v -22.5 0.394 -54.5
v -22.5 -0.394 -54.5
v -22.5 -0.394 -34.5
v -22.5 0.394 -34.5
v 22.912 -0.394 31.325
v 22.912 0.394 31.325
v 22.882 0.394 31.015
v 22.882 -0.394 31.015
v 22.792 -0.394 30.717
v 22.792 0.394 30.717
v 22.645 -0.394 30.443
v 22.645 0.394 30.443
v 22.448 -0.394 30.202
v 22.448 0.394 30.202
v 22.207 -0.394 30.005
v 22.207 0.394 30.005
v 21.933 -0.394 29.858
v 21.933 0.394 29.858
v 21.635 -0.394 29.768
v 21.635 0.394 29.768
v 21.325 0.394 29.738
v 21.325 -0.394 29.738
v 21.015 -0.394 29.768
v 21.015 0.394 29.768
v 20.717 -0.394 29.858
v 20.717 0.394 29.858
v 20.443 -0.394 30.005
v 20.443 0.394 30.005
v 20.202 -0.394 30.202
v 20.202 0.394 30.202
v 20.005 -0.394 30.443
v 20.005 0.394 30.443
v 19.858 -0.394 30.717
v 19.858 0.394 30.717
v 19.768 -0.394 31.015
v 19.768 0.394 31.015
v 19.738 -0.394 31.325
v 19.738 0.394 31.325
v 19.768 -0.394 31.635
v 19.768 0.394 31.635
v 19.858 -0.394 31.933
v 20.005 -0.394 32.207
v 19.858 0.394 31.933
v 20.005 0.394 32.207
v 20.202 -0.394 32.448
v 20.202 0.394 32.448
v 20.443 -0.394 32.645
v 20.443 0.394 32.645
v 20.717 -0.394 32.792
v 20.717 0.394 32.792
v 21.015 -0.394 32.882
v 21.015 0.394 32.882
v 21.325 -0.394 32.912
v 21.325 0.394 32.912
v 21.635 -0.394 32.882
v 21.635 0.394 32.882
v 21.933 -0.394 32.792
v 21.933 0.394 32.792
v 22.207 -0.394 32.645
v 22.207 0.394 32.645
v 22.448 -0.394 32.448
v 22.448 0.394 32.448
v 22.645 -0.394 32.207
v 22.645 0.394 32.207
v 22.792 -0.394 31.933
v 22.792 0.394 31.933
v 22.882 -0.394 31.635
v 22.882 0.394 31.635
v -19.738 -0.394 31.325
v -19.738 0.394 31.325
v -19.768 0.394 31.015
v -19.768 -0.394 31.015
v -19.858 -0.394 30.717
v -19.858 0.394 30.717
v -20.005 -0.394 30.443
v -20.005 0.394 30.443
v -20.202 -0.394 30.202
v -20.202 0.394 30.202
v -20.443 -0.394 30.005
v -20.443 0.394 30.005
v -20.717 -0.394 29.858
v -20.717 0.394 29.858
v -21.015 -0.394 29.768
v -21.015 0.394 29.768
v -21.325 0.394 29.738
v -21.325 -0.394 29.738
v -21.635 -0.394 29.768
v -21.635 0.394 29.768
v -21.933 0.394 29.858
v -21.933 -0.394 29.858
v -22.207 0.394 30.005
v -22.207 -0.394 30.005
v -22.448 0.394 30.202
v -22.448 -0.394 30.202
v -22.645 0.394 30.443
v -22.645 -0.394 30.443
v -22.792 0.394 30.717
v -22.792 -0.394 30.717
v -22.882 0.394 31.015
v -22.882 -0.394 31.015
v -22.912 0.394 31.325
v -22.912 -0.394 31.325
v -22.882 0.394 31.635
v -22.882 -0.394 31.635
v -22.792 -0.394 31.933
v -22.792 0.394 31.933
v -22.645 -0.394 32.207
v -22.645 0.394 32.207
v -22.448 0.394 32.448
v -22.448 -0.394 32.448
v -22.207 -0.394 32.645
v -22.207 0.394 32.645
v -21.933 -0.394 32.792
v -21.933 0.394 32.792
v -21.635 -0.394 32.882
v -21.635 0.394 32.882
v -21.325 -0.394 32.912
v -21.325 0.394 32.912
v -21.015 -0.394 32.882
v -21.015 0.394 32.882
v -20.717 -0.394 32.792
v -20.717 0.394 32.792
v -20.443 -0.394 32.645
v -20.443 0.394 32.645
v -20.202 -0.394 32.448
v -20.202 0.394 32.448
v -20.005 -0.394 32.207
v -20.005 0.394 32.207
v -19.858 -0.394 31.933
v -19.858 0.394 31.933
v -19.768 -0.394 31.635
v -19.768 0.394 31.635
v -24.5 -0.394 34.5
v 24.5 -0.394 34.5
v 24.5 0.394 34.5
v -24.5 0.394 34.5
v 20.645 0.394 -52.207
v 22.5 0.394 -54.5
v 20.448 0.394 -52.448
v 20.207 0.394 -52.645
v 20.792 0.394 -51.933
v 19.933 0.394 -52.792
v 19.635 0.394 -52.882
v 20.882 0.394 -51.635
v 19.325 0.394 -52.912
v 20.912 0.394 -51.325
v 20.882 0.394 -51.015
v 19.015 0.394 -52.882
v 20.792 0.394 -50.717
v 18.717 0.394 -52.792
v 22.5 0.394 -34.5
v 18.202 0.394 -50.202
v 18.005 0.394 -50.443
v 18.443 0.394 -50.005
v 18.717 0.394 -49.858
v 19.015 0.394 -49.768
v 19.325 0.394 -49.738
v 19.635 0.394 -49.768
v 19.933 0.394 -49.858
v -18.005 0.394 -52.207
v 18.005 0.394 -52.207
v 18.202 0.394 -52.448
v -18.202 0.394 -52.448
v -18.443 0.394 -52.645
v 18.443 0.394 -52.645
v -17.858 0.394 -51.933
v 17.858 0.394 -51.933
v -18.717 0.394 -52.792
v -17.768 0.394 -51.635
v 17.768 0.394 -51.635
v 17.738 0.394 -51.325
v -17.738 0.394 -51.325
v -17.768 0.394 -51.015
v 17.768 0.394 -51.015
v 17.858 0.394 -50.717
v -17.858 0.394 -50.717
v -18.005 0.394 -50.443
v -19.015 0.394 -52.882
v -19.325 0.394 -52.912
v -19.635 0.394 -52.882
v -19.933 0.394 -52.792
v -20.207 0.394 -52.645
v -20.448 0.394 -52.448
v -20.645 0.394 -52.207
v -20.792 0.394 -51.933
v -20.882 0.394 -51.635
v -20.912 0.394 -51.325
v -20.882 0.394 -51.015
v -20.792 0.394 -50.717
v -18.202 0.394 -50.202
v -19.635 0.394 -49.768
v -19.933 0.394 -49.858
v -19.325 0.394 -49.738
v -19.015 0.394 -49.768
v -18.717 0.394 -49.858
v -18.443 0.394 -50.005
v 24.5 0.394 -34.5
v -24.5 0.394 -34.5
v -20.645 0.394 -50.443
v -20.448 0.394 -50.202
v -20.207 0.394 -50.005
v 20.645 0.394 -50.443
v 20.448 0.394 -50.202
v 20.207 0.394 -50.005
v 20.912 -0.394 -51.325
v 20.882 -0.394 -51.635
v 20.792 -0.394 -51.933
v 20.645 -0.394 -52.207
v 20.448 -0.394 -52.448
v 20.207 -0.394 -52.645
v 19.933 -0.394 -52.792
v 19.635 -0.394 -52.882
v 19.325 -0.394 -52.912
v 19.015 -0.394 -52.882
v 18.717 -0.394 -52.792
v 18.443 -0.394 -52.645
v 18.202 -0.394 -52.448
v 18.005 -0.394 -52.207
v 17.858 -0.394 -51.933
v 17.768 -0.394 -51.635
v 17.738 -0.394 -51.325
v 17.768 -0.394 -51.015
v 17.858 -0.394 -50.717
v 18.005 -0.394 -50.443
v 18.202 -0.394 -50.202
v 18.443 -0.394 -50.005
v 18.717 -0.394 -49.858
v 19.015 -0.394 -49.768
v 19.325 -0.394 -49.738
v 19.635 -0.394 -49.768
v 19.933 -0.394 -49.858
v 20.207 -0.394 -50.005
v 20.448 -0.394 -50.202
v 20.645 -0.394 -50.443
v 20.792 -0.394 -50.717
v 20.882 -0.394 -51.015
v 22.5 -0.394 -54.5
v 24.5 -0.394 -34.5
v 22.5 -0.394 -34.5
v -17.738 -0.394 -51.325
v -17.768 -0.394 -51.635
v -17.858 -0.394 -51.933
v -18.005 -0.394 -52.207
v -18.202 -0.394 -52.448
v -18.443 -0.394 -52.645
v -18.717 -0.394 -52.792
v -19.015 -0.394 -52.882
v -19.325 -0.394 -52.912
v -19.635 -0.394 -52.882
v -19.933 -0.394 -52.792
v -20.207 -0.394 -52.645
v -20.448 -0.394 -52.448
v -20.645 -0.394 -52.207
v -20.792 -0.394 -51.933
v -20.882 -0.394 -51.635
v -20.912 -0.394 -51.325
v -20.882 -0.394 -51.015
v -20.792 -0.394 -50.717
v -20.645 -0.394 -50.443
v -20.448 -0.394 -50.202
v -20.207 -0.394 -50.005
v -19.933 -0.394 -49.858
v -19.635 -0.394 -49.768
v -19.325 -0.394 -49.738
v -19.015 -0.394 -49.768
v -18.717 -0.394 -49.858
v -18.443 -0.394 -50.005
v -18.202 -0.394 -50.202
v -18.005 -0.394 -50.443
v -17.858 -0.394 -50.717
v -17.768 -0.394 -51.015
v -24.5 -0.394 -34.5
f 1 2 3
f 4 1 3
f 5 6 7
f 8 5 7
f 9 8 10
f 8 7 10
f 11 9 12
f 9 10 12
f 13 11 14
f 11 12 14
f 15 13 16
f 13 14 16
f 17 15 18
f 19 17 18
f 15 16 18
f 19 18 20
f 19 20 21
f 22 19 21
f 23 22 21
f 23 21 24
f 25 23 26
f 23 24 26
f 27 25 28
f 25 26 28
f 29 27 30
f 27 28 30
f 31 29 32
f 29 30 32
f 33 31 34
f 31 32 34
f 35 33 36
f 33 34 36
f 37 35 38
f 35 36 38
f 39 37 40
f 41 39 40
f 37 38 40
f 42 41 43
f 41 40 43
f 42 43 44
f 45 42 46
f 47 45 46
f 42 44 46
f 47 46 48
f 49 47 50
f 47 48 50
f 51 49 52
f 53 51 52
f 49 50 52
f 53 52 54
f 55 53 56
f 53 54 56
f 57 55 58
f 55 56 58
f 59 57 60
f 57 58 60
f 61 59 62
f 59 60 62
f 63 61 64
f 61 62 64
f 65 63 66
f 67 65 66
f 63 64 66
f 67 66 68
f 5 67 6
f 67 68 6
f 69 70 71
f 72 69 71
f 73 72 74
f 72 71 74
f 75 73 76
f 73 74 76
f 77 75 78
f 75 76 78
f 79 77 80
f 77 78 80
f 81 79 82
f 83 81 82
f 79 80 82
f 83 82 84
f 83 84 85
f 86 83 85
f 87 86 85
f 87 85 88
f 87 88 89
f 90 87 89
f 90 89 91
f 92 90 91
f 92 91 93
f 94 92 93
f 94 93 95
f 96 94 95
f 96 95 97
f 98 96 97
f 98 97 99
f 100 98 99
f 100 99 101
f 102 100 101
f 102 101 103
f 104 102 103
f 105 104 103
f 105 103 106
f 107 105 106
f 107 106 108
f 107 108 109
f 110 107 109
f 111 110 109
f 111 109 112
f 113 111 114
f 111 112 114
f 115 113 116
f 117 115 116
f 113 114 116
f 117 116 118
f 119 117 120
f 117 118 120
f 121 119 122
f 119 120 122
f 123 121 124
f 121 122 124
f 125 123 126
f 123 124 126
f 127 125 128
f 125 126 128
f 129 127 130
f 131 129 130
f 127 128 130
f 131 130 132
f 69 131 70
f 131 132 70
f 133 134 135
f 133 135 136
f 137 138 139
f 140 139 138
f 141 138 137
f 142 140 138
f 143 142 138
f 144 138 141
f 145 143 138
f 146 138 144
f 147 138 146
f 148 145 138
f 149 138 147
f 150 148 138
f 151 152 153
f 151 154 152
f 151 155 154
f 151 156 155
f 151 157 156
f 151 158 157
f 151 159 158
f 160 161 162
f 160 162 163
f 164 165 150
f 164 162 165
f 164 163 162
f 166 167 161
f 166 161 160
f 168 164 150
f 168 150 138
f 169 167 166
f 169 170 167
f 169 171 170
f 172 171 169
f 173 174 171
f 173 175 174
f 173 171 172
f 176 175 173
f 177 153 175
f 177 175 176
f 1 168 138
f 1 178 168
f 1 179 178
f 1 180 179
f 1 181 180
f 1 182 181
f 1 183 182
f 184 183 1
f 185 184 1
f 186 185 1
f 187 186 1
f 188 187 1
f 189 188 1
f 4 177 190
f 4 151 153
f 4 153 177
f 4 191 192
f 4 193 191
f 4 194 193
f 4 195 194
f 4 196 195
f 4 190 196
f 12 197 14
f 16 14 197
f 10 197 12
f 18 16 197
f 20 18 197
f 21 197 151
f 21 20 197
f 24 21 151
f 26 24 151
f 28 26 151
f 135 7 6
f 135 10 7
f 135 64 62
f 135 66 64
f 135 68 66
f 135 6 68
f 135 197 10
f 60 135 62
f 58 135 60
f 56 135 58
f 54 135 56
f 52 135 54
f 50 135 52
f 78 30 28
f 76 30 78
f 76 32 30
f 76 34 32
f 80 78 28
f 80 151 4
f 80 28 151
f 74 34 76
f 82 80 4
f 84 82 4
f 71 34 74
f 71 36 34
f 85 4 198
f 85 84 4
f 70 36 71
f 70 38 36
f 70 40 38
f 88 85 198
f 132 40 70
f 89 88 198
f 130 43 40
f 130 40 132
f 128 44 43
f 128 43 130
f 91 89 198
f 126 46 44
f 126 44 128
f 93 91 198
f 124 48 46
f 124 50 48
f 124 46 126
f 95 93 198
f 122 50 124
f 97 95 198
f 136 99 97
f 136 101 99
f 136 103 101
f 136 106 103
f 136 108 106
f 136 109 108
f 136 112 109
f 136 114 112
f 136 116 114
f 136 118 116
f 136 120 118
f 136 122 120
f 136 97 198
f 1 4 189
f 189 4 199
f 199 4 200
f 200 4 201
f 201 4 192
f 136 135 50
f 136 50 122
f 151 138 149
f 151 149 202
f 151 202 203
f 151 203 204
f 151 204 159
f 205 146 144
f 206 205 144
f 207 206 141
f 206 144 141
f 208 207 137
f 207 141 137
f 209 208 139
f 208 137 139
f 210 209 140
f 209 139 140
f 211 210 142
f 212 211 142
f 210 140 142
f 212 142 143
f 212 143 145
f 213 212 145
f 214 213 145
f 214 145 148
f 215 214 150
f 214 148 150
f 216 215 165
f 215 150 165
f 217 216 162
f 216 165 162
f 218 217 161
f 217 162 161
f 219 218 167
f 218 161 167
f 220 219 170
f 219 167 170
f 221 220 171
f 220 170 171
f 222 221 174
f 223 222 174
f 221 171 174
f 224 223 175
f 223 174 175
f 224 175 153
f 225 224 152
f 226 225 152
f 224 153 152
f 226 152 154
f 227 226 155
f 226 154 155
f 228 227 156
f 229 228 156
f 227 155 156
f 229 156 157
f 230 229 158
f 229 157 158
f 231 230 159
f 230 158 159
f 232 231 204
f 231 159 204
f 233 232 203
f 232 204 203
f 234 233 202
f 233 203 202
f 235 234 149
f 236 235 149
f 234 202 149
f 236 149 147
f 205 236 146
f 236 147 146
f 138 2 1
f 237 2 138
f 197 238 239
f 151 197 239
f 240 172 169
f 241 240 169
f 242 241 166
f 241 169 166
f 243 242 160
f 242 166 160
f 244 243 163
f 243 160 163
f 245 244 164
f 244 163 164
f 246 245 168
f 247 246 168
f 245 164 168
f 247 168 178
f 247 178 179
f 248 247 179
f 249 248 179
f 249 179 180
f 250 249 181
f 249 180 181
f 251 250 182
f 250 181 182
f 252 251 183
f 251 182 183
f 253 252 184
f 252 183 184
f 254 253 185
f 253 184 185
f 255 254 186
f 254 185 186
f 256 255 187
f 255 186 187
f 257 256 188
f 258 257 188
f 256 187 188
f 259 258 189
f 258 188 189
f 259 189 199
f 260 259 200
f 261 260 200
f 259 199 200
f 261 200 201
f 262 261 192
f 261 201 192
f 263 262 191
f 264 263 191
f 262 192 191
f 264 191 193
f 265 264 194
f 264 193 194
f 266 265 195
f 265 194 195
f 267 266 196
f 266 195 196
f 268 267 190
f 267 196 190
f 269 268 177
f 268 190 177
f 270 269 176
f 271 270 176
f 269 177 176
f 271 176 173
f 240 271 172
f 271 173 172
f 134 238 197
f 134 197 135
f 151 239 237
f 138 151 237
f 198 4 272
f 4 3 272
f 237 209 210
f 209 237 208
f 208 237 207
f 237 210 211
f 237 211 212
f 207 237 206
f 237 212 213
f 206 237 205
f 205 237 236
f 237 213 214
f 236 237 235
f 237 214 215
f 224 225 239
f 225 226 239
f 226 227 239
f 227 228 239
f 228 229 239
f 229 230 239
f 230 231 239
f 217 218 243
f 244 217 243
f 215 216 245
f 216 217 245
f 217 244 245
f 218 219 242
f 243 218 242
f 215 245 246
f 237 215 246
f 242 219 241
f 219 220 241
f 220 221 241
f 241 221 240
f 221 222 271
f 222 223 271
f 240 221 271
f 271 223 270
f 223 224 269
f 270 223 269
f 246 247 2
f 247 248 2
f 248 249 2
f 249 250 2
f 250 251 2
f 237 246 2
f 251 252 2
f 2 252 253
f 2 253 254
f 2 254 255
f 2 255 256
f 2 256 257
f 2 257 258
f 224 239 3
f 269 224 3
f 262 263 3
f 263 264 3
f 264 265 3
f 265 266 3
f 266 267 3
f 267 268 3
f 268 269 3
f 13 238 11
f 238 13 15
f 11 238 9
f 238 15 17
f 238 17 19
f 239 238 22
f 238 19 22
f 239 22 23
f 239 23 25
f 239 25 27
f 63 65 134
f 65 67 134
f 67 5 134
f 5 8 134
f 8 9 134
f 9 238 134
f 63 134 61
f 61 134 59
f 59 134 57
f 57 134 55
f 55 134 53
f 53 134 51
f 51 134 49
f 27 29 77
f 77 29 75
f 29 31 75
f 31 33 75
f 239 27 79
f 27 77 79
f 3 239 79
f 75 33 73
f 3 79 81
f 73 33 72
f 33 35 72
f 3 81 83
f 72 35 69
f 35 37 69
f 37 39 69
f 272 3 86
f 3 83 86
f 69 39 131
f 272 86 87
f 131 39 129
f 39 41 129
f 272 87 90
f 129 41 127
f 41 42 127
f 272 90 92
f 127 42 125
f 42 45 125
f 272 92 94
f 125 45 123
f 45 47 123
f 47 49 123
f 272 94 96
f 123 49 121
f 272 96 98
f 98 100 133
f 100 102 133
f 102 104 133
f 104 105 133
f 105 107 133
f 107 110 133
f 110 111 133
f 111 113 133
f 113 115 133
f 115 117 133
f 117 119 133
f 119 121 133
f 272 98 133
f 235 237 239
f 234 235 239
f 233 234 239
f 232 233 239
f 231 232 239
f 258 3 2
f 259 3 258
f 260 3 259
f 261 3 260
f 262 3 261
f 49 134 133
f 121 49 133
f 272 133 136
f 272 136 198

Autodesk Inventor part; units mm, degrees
ref_plane "YZ Plane" through (0, 0, 0) normal (1, 0, 0) x (0, 1, 0)
ref_plane "XZ Plane" through (0, 0, 0) normal (0, 1, 0) x (-1, 0, 0)
ref_plane "XY Plane" through (0, 0, 0) normal (0, 0, 1) x (1, 0, 0)
sketch "Sketch1" plane through (0, 0, 0) normal (0, 1, 0) x (-1, 0, 0)
  line L0 (-24.5, 34.5) -> (24.5, 34.5)
  line L1 (24.5, 34.5) -> (24.5, -34.5)
  line L2 (-24.5, -34.5) -> (-24.5, 34.5)
  line L3 (-24.5, 34.5) -> (24.5, -34.5) construction
  line L4 (24.5, 34.5) -> (-24.5, -34.5) construction
  line L5 (22.5, -54.5) -> (-22.5, -54.5)
  line L6 (-22.5, -14.5) -> (22.5, -54.5) construction
  line L7 (22.5, -14.5) -> (-22.5, -54.5) construction
  line L8 (-22.5, -34.5) -> (-22.5, -54.5)
  line L9 (-22.5, -54.5) -> (22.5, -54.5)
  line L10 (22.5, -54.5) -> (22.5, -34.5)
  line L11 (22.5, -34.5) -> (24.5, -34.5)
  line L12 (-24.5, -34.5) -> (-22.5, -34.5)
  line L13 (-22.5, -54.5) -> (-19.325, -54.5)
  line L14 (-19.325, -54.5) -> (-19.325, -51.325)
  line L15 (-19.325, -51.325) -> (-22.5, -51.325)
  line L16 (-22.5, -51.325) -> (-22.5, -54.5)
  point P0 (0, 0)
  point P1 (0, -34.5)
  dimension "d0" = 49
  dimension "d1" = 69
  dimension "d2" = 45
  dimension "d3" = 40
  dimension "d6" = 3.175
  dimension "d7" = 3.175
extrude "Extrusion1" add sketch "Sketch1" along normal mid plane 0.7874
sketch "Sketch2" plane through (0, 0.3937, 0) normal (0, 1, 0) x (1, 0, 0)
  circle A0 centre (-19.325, 51.325) radius 1.5875
  circle A1 centre (19.325, 51.325) radius 1.5875
  circle A2 centre (21.325, -31.325) radius 1.5875
  circle A3 centre (-21.325, -31.325) radius 1.5875
  point P0 (0, 0)
  point P1 (24.5, -34.5)
  point P2 (-22.5, 54.5)
  dimension "d16" = 3.175
  dimension "d17" = 3.175
  dimension "d18" = 3.175
  dimension "d19" = 3.175
extrude "Extrusion2" cut sketch "Sketch2" against normal through all
properties part number "89x49mm-PCB"
